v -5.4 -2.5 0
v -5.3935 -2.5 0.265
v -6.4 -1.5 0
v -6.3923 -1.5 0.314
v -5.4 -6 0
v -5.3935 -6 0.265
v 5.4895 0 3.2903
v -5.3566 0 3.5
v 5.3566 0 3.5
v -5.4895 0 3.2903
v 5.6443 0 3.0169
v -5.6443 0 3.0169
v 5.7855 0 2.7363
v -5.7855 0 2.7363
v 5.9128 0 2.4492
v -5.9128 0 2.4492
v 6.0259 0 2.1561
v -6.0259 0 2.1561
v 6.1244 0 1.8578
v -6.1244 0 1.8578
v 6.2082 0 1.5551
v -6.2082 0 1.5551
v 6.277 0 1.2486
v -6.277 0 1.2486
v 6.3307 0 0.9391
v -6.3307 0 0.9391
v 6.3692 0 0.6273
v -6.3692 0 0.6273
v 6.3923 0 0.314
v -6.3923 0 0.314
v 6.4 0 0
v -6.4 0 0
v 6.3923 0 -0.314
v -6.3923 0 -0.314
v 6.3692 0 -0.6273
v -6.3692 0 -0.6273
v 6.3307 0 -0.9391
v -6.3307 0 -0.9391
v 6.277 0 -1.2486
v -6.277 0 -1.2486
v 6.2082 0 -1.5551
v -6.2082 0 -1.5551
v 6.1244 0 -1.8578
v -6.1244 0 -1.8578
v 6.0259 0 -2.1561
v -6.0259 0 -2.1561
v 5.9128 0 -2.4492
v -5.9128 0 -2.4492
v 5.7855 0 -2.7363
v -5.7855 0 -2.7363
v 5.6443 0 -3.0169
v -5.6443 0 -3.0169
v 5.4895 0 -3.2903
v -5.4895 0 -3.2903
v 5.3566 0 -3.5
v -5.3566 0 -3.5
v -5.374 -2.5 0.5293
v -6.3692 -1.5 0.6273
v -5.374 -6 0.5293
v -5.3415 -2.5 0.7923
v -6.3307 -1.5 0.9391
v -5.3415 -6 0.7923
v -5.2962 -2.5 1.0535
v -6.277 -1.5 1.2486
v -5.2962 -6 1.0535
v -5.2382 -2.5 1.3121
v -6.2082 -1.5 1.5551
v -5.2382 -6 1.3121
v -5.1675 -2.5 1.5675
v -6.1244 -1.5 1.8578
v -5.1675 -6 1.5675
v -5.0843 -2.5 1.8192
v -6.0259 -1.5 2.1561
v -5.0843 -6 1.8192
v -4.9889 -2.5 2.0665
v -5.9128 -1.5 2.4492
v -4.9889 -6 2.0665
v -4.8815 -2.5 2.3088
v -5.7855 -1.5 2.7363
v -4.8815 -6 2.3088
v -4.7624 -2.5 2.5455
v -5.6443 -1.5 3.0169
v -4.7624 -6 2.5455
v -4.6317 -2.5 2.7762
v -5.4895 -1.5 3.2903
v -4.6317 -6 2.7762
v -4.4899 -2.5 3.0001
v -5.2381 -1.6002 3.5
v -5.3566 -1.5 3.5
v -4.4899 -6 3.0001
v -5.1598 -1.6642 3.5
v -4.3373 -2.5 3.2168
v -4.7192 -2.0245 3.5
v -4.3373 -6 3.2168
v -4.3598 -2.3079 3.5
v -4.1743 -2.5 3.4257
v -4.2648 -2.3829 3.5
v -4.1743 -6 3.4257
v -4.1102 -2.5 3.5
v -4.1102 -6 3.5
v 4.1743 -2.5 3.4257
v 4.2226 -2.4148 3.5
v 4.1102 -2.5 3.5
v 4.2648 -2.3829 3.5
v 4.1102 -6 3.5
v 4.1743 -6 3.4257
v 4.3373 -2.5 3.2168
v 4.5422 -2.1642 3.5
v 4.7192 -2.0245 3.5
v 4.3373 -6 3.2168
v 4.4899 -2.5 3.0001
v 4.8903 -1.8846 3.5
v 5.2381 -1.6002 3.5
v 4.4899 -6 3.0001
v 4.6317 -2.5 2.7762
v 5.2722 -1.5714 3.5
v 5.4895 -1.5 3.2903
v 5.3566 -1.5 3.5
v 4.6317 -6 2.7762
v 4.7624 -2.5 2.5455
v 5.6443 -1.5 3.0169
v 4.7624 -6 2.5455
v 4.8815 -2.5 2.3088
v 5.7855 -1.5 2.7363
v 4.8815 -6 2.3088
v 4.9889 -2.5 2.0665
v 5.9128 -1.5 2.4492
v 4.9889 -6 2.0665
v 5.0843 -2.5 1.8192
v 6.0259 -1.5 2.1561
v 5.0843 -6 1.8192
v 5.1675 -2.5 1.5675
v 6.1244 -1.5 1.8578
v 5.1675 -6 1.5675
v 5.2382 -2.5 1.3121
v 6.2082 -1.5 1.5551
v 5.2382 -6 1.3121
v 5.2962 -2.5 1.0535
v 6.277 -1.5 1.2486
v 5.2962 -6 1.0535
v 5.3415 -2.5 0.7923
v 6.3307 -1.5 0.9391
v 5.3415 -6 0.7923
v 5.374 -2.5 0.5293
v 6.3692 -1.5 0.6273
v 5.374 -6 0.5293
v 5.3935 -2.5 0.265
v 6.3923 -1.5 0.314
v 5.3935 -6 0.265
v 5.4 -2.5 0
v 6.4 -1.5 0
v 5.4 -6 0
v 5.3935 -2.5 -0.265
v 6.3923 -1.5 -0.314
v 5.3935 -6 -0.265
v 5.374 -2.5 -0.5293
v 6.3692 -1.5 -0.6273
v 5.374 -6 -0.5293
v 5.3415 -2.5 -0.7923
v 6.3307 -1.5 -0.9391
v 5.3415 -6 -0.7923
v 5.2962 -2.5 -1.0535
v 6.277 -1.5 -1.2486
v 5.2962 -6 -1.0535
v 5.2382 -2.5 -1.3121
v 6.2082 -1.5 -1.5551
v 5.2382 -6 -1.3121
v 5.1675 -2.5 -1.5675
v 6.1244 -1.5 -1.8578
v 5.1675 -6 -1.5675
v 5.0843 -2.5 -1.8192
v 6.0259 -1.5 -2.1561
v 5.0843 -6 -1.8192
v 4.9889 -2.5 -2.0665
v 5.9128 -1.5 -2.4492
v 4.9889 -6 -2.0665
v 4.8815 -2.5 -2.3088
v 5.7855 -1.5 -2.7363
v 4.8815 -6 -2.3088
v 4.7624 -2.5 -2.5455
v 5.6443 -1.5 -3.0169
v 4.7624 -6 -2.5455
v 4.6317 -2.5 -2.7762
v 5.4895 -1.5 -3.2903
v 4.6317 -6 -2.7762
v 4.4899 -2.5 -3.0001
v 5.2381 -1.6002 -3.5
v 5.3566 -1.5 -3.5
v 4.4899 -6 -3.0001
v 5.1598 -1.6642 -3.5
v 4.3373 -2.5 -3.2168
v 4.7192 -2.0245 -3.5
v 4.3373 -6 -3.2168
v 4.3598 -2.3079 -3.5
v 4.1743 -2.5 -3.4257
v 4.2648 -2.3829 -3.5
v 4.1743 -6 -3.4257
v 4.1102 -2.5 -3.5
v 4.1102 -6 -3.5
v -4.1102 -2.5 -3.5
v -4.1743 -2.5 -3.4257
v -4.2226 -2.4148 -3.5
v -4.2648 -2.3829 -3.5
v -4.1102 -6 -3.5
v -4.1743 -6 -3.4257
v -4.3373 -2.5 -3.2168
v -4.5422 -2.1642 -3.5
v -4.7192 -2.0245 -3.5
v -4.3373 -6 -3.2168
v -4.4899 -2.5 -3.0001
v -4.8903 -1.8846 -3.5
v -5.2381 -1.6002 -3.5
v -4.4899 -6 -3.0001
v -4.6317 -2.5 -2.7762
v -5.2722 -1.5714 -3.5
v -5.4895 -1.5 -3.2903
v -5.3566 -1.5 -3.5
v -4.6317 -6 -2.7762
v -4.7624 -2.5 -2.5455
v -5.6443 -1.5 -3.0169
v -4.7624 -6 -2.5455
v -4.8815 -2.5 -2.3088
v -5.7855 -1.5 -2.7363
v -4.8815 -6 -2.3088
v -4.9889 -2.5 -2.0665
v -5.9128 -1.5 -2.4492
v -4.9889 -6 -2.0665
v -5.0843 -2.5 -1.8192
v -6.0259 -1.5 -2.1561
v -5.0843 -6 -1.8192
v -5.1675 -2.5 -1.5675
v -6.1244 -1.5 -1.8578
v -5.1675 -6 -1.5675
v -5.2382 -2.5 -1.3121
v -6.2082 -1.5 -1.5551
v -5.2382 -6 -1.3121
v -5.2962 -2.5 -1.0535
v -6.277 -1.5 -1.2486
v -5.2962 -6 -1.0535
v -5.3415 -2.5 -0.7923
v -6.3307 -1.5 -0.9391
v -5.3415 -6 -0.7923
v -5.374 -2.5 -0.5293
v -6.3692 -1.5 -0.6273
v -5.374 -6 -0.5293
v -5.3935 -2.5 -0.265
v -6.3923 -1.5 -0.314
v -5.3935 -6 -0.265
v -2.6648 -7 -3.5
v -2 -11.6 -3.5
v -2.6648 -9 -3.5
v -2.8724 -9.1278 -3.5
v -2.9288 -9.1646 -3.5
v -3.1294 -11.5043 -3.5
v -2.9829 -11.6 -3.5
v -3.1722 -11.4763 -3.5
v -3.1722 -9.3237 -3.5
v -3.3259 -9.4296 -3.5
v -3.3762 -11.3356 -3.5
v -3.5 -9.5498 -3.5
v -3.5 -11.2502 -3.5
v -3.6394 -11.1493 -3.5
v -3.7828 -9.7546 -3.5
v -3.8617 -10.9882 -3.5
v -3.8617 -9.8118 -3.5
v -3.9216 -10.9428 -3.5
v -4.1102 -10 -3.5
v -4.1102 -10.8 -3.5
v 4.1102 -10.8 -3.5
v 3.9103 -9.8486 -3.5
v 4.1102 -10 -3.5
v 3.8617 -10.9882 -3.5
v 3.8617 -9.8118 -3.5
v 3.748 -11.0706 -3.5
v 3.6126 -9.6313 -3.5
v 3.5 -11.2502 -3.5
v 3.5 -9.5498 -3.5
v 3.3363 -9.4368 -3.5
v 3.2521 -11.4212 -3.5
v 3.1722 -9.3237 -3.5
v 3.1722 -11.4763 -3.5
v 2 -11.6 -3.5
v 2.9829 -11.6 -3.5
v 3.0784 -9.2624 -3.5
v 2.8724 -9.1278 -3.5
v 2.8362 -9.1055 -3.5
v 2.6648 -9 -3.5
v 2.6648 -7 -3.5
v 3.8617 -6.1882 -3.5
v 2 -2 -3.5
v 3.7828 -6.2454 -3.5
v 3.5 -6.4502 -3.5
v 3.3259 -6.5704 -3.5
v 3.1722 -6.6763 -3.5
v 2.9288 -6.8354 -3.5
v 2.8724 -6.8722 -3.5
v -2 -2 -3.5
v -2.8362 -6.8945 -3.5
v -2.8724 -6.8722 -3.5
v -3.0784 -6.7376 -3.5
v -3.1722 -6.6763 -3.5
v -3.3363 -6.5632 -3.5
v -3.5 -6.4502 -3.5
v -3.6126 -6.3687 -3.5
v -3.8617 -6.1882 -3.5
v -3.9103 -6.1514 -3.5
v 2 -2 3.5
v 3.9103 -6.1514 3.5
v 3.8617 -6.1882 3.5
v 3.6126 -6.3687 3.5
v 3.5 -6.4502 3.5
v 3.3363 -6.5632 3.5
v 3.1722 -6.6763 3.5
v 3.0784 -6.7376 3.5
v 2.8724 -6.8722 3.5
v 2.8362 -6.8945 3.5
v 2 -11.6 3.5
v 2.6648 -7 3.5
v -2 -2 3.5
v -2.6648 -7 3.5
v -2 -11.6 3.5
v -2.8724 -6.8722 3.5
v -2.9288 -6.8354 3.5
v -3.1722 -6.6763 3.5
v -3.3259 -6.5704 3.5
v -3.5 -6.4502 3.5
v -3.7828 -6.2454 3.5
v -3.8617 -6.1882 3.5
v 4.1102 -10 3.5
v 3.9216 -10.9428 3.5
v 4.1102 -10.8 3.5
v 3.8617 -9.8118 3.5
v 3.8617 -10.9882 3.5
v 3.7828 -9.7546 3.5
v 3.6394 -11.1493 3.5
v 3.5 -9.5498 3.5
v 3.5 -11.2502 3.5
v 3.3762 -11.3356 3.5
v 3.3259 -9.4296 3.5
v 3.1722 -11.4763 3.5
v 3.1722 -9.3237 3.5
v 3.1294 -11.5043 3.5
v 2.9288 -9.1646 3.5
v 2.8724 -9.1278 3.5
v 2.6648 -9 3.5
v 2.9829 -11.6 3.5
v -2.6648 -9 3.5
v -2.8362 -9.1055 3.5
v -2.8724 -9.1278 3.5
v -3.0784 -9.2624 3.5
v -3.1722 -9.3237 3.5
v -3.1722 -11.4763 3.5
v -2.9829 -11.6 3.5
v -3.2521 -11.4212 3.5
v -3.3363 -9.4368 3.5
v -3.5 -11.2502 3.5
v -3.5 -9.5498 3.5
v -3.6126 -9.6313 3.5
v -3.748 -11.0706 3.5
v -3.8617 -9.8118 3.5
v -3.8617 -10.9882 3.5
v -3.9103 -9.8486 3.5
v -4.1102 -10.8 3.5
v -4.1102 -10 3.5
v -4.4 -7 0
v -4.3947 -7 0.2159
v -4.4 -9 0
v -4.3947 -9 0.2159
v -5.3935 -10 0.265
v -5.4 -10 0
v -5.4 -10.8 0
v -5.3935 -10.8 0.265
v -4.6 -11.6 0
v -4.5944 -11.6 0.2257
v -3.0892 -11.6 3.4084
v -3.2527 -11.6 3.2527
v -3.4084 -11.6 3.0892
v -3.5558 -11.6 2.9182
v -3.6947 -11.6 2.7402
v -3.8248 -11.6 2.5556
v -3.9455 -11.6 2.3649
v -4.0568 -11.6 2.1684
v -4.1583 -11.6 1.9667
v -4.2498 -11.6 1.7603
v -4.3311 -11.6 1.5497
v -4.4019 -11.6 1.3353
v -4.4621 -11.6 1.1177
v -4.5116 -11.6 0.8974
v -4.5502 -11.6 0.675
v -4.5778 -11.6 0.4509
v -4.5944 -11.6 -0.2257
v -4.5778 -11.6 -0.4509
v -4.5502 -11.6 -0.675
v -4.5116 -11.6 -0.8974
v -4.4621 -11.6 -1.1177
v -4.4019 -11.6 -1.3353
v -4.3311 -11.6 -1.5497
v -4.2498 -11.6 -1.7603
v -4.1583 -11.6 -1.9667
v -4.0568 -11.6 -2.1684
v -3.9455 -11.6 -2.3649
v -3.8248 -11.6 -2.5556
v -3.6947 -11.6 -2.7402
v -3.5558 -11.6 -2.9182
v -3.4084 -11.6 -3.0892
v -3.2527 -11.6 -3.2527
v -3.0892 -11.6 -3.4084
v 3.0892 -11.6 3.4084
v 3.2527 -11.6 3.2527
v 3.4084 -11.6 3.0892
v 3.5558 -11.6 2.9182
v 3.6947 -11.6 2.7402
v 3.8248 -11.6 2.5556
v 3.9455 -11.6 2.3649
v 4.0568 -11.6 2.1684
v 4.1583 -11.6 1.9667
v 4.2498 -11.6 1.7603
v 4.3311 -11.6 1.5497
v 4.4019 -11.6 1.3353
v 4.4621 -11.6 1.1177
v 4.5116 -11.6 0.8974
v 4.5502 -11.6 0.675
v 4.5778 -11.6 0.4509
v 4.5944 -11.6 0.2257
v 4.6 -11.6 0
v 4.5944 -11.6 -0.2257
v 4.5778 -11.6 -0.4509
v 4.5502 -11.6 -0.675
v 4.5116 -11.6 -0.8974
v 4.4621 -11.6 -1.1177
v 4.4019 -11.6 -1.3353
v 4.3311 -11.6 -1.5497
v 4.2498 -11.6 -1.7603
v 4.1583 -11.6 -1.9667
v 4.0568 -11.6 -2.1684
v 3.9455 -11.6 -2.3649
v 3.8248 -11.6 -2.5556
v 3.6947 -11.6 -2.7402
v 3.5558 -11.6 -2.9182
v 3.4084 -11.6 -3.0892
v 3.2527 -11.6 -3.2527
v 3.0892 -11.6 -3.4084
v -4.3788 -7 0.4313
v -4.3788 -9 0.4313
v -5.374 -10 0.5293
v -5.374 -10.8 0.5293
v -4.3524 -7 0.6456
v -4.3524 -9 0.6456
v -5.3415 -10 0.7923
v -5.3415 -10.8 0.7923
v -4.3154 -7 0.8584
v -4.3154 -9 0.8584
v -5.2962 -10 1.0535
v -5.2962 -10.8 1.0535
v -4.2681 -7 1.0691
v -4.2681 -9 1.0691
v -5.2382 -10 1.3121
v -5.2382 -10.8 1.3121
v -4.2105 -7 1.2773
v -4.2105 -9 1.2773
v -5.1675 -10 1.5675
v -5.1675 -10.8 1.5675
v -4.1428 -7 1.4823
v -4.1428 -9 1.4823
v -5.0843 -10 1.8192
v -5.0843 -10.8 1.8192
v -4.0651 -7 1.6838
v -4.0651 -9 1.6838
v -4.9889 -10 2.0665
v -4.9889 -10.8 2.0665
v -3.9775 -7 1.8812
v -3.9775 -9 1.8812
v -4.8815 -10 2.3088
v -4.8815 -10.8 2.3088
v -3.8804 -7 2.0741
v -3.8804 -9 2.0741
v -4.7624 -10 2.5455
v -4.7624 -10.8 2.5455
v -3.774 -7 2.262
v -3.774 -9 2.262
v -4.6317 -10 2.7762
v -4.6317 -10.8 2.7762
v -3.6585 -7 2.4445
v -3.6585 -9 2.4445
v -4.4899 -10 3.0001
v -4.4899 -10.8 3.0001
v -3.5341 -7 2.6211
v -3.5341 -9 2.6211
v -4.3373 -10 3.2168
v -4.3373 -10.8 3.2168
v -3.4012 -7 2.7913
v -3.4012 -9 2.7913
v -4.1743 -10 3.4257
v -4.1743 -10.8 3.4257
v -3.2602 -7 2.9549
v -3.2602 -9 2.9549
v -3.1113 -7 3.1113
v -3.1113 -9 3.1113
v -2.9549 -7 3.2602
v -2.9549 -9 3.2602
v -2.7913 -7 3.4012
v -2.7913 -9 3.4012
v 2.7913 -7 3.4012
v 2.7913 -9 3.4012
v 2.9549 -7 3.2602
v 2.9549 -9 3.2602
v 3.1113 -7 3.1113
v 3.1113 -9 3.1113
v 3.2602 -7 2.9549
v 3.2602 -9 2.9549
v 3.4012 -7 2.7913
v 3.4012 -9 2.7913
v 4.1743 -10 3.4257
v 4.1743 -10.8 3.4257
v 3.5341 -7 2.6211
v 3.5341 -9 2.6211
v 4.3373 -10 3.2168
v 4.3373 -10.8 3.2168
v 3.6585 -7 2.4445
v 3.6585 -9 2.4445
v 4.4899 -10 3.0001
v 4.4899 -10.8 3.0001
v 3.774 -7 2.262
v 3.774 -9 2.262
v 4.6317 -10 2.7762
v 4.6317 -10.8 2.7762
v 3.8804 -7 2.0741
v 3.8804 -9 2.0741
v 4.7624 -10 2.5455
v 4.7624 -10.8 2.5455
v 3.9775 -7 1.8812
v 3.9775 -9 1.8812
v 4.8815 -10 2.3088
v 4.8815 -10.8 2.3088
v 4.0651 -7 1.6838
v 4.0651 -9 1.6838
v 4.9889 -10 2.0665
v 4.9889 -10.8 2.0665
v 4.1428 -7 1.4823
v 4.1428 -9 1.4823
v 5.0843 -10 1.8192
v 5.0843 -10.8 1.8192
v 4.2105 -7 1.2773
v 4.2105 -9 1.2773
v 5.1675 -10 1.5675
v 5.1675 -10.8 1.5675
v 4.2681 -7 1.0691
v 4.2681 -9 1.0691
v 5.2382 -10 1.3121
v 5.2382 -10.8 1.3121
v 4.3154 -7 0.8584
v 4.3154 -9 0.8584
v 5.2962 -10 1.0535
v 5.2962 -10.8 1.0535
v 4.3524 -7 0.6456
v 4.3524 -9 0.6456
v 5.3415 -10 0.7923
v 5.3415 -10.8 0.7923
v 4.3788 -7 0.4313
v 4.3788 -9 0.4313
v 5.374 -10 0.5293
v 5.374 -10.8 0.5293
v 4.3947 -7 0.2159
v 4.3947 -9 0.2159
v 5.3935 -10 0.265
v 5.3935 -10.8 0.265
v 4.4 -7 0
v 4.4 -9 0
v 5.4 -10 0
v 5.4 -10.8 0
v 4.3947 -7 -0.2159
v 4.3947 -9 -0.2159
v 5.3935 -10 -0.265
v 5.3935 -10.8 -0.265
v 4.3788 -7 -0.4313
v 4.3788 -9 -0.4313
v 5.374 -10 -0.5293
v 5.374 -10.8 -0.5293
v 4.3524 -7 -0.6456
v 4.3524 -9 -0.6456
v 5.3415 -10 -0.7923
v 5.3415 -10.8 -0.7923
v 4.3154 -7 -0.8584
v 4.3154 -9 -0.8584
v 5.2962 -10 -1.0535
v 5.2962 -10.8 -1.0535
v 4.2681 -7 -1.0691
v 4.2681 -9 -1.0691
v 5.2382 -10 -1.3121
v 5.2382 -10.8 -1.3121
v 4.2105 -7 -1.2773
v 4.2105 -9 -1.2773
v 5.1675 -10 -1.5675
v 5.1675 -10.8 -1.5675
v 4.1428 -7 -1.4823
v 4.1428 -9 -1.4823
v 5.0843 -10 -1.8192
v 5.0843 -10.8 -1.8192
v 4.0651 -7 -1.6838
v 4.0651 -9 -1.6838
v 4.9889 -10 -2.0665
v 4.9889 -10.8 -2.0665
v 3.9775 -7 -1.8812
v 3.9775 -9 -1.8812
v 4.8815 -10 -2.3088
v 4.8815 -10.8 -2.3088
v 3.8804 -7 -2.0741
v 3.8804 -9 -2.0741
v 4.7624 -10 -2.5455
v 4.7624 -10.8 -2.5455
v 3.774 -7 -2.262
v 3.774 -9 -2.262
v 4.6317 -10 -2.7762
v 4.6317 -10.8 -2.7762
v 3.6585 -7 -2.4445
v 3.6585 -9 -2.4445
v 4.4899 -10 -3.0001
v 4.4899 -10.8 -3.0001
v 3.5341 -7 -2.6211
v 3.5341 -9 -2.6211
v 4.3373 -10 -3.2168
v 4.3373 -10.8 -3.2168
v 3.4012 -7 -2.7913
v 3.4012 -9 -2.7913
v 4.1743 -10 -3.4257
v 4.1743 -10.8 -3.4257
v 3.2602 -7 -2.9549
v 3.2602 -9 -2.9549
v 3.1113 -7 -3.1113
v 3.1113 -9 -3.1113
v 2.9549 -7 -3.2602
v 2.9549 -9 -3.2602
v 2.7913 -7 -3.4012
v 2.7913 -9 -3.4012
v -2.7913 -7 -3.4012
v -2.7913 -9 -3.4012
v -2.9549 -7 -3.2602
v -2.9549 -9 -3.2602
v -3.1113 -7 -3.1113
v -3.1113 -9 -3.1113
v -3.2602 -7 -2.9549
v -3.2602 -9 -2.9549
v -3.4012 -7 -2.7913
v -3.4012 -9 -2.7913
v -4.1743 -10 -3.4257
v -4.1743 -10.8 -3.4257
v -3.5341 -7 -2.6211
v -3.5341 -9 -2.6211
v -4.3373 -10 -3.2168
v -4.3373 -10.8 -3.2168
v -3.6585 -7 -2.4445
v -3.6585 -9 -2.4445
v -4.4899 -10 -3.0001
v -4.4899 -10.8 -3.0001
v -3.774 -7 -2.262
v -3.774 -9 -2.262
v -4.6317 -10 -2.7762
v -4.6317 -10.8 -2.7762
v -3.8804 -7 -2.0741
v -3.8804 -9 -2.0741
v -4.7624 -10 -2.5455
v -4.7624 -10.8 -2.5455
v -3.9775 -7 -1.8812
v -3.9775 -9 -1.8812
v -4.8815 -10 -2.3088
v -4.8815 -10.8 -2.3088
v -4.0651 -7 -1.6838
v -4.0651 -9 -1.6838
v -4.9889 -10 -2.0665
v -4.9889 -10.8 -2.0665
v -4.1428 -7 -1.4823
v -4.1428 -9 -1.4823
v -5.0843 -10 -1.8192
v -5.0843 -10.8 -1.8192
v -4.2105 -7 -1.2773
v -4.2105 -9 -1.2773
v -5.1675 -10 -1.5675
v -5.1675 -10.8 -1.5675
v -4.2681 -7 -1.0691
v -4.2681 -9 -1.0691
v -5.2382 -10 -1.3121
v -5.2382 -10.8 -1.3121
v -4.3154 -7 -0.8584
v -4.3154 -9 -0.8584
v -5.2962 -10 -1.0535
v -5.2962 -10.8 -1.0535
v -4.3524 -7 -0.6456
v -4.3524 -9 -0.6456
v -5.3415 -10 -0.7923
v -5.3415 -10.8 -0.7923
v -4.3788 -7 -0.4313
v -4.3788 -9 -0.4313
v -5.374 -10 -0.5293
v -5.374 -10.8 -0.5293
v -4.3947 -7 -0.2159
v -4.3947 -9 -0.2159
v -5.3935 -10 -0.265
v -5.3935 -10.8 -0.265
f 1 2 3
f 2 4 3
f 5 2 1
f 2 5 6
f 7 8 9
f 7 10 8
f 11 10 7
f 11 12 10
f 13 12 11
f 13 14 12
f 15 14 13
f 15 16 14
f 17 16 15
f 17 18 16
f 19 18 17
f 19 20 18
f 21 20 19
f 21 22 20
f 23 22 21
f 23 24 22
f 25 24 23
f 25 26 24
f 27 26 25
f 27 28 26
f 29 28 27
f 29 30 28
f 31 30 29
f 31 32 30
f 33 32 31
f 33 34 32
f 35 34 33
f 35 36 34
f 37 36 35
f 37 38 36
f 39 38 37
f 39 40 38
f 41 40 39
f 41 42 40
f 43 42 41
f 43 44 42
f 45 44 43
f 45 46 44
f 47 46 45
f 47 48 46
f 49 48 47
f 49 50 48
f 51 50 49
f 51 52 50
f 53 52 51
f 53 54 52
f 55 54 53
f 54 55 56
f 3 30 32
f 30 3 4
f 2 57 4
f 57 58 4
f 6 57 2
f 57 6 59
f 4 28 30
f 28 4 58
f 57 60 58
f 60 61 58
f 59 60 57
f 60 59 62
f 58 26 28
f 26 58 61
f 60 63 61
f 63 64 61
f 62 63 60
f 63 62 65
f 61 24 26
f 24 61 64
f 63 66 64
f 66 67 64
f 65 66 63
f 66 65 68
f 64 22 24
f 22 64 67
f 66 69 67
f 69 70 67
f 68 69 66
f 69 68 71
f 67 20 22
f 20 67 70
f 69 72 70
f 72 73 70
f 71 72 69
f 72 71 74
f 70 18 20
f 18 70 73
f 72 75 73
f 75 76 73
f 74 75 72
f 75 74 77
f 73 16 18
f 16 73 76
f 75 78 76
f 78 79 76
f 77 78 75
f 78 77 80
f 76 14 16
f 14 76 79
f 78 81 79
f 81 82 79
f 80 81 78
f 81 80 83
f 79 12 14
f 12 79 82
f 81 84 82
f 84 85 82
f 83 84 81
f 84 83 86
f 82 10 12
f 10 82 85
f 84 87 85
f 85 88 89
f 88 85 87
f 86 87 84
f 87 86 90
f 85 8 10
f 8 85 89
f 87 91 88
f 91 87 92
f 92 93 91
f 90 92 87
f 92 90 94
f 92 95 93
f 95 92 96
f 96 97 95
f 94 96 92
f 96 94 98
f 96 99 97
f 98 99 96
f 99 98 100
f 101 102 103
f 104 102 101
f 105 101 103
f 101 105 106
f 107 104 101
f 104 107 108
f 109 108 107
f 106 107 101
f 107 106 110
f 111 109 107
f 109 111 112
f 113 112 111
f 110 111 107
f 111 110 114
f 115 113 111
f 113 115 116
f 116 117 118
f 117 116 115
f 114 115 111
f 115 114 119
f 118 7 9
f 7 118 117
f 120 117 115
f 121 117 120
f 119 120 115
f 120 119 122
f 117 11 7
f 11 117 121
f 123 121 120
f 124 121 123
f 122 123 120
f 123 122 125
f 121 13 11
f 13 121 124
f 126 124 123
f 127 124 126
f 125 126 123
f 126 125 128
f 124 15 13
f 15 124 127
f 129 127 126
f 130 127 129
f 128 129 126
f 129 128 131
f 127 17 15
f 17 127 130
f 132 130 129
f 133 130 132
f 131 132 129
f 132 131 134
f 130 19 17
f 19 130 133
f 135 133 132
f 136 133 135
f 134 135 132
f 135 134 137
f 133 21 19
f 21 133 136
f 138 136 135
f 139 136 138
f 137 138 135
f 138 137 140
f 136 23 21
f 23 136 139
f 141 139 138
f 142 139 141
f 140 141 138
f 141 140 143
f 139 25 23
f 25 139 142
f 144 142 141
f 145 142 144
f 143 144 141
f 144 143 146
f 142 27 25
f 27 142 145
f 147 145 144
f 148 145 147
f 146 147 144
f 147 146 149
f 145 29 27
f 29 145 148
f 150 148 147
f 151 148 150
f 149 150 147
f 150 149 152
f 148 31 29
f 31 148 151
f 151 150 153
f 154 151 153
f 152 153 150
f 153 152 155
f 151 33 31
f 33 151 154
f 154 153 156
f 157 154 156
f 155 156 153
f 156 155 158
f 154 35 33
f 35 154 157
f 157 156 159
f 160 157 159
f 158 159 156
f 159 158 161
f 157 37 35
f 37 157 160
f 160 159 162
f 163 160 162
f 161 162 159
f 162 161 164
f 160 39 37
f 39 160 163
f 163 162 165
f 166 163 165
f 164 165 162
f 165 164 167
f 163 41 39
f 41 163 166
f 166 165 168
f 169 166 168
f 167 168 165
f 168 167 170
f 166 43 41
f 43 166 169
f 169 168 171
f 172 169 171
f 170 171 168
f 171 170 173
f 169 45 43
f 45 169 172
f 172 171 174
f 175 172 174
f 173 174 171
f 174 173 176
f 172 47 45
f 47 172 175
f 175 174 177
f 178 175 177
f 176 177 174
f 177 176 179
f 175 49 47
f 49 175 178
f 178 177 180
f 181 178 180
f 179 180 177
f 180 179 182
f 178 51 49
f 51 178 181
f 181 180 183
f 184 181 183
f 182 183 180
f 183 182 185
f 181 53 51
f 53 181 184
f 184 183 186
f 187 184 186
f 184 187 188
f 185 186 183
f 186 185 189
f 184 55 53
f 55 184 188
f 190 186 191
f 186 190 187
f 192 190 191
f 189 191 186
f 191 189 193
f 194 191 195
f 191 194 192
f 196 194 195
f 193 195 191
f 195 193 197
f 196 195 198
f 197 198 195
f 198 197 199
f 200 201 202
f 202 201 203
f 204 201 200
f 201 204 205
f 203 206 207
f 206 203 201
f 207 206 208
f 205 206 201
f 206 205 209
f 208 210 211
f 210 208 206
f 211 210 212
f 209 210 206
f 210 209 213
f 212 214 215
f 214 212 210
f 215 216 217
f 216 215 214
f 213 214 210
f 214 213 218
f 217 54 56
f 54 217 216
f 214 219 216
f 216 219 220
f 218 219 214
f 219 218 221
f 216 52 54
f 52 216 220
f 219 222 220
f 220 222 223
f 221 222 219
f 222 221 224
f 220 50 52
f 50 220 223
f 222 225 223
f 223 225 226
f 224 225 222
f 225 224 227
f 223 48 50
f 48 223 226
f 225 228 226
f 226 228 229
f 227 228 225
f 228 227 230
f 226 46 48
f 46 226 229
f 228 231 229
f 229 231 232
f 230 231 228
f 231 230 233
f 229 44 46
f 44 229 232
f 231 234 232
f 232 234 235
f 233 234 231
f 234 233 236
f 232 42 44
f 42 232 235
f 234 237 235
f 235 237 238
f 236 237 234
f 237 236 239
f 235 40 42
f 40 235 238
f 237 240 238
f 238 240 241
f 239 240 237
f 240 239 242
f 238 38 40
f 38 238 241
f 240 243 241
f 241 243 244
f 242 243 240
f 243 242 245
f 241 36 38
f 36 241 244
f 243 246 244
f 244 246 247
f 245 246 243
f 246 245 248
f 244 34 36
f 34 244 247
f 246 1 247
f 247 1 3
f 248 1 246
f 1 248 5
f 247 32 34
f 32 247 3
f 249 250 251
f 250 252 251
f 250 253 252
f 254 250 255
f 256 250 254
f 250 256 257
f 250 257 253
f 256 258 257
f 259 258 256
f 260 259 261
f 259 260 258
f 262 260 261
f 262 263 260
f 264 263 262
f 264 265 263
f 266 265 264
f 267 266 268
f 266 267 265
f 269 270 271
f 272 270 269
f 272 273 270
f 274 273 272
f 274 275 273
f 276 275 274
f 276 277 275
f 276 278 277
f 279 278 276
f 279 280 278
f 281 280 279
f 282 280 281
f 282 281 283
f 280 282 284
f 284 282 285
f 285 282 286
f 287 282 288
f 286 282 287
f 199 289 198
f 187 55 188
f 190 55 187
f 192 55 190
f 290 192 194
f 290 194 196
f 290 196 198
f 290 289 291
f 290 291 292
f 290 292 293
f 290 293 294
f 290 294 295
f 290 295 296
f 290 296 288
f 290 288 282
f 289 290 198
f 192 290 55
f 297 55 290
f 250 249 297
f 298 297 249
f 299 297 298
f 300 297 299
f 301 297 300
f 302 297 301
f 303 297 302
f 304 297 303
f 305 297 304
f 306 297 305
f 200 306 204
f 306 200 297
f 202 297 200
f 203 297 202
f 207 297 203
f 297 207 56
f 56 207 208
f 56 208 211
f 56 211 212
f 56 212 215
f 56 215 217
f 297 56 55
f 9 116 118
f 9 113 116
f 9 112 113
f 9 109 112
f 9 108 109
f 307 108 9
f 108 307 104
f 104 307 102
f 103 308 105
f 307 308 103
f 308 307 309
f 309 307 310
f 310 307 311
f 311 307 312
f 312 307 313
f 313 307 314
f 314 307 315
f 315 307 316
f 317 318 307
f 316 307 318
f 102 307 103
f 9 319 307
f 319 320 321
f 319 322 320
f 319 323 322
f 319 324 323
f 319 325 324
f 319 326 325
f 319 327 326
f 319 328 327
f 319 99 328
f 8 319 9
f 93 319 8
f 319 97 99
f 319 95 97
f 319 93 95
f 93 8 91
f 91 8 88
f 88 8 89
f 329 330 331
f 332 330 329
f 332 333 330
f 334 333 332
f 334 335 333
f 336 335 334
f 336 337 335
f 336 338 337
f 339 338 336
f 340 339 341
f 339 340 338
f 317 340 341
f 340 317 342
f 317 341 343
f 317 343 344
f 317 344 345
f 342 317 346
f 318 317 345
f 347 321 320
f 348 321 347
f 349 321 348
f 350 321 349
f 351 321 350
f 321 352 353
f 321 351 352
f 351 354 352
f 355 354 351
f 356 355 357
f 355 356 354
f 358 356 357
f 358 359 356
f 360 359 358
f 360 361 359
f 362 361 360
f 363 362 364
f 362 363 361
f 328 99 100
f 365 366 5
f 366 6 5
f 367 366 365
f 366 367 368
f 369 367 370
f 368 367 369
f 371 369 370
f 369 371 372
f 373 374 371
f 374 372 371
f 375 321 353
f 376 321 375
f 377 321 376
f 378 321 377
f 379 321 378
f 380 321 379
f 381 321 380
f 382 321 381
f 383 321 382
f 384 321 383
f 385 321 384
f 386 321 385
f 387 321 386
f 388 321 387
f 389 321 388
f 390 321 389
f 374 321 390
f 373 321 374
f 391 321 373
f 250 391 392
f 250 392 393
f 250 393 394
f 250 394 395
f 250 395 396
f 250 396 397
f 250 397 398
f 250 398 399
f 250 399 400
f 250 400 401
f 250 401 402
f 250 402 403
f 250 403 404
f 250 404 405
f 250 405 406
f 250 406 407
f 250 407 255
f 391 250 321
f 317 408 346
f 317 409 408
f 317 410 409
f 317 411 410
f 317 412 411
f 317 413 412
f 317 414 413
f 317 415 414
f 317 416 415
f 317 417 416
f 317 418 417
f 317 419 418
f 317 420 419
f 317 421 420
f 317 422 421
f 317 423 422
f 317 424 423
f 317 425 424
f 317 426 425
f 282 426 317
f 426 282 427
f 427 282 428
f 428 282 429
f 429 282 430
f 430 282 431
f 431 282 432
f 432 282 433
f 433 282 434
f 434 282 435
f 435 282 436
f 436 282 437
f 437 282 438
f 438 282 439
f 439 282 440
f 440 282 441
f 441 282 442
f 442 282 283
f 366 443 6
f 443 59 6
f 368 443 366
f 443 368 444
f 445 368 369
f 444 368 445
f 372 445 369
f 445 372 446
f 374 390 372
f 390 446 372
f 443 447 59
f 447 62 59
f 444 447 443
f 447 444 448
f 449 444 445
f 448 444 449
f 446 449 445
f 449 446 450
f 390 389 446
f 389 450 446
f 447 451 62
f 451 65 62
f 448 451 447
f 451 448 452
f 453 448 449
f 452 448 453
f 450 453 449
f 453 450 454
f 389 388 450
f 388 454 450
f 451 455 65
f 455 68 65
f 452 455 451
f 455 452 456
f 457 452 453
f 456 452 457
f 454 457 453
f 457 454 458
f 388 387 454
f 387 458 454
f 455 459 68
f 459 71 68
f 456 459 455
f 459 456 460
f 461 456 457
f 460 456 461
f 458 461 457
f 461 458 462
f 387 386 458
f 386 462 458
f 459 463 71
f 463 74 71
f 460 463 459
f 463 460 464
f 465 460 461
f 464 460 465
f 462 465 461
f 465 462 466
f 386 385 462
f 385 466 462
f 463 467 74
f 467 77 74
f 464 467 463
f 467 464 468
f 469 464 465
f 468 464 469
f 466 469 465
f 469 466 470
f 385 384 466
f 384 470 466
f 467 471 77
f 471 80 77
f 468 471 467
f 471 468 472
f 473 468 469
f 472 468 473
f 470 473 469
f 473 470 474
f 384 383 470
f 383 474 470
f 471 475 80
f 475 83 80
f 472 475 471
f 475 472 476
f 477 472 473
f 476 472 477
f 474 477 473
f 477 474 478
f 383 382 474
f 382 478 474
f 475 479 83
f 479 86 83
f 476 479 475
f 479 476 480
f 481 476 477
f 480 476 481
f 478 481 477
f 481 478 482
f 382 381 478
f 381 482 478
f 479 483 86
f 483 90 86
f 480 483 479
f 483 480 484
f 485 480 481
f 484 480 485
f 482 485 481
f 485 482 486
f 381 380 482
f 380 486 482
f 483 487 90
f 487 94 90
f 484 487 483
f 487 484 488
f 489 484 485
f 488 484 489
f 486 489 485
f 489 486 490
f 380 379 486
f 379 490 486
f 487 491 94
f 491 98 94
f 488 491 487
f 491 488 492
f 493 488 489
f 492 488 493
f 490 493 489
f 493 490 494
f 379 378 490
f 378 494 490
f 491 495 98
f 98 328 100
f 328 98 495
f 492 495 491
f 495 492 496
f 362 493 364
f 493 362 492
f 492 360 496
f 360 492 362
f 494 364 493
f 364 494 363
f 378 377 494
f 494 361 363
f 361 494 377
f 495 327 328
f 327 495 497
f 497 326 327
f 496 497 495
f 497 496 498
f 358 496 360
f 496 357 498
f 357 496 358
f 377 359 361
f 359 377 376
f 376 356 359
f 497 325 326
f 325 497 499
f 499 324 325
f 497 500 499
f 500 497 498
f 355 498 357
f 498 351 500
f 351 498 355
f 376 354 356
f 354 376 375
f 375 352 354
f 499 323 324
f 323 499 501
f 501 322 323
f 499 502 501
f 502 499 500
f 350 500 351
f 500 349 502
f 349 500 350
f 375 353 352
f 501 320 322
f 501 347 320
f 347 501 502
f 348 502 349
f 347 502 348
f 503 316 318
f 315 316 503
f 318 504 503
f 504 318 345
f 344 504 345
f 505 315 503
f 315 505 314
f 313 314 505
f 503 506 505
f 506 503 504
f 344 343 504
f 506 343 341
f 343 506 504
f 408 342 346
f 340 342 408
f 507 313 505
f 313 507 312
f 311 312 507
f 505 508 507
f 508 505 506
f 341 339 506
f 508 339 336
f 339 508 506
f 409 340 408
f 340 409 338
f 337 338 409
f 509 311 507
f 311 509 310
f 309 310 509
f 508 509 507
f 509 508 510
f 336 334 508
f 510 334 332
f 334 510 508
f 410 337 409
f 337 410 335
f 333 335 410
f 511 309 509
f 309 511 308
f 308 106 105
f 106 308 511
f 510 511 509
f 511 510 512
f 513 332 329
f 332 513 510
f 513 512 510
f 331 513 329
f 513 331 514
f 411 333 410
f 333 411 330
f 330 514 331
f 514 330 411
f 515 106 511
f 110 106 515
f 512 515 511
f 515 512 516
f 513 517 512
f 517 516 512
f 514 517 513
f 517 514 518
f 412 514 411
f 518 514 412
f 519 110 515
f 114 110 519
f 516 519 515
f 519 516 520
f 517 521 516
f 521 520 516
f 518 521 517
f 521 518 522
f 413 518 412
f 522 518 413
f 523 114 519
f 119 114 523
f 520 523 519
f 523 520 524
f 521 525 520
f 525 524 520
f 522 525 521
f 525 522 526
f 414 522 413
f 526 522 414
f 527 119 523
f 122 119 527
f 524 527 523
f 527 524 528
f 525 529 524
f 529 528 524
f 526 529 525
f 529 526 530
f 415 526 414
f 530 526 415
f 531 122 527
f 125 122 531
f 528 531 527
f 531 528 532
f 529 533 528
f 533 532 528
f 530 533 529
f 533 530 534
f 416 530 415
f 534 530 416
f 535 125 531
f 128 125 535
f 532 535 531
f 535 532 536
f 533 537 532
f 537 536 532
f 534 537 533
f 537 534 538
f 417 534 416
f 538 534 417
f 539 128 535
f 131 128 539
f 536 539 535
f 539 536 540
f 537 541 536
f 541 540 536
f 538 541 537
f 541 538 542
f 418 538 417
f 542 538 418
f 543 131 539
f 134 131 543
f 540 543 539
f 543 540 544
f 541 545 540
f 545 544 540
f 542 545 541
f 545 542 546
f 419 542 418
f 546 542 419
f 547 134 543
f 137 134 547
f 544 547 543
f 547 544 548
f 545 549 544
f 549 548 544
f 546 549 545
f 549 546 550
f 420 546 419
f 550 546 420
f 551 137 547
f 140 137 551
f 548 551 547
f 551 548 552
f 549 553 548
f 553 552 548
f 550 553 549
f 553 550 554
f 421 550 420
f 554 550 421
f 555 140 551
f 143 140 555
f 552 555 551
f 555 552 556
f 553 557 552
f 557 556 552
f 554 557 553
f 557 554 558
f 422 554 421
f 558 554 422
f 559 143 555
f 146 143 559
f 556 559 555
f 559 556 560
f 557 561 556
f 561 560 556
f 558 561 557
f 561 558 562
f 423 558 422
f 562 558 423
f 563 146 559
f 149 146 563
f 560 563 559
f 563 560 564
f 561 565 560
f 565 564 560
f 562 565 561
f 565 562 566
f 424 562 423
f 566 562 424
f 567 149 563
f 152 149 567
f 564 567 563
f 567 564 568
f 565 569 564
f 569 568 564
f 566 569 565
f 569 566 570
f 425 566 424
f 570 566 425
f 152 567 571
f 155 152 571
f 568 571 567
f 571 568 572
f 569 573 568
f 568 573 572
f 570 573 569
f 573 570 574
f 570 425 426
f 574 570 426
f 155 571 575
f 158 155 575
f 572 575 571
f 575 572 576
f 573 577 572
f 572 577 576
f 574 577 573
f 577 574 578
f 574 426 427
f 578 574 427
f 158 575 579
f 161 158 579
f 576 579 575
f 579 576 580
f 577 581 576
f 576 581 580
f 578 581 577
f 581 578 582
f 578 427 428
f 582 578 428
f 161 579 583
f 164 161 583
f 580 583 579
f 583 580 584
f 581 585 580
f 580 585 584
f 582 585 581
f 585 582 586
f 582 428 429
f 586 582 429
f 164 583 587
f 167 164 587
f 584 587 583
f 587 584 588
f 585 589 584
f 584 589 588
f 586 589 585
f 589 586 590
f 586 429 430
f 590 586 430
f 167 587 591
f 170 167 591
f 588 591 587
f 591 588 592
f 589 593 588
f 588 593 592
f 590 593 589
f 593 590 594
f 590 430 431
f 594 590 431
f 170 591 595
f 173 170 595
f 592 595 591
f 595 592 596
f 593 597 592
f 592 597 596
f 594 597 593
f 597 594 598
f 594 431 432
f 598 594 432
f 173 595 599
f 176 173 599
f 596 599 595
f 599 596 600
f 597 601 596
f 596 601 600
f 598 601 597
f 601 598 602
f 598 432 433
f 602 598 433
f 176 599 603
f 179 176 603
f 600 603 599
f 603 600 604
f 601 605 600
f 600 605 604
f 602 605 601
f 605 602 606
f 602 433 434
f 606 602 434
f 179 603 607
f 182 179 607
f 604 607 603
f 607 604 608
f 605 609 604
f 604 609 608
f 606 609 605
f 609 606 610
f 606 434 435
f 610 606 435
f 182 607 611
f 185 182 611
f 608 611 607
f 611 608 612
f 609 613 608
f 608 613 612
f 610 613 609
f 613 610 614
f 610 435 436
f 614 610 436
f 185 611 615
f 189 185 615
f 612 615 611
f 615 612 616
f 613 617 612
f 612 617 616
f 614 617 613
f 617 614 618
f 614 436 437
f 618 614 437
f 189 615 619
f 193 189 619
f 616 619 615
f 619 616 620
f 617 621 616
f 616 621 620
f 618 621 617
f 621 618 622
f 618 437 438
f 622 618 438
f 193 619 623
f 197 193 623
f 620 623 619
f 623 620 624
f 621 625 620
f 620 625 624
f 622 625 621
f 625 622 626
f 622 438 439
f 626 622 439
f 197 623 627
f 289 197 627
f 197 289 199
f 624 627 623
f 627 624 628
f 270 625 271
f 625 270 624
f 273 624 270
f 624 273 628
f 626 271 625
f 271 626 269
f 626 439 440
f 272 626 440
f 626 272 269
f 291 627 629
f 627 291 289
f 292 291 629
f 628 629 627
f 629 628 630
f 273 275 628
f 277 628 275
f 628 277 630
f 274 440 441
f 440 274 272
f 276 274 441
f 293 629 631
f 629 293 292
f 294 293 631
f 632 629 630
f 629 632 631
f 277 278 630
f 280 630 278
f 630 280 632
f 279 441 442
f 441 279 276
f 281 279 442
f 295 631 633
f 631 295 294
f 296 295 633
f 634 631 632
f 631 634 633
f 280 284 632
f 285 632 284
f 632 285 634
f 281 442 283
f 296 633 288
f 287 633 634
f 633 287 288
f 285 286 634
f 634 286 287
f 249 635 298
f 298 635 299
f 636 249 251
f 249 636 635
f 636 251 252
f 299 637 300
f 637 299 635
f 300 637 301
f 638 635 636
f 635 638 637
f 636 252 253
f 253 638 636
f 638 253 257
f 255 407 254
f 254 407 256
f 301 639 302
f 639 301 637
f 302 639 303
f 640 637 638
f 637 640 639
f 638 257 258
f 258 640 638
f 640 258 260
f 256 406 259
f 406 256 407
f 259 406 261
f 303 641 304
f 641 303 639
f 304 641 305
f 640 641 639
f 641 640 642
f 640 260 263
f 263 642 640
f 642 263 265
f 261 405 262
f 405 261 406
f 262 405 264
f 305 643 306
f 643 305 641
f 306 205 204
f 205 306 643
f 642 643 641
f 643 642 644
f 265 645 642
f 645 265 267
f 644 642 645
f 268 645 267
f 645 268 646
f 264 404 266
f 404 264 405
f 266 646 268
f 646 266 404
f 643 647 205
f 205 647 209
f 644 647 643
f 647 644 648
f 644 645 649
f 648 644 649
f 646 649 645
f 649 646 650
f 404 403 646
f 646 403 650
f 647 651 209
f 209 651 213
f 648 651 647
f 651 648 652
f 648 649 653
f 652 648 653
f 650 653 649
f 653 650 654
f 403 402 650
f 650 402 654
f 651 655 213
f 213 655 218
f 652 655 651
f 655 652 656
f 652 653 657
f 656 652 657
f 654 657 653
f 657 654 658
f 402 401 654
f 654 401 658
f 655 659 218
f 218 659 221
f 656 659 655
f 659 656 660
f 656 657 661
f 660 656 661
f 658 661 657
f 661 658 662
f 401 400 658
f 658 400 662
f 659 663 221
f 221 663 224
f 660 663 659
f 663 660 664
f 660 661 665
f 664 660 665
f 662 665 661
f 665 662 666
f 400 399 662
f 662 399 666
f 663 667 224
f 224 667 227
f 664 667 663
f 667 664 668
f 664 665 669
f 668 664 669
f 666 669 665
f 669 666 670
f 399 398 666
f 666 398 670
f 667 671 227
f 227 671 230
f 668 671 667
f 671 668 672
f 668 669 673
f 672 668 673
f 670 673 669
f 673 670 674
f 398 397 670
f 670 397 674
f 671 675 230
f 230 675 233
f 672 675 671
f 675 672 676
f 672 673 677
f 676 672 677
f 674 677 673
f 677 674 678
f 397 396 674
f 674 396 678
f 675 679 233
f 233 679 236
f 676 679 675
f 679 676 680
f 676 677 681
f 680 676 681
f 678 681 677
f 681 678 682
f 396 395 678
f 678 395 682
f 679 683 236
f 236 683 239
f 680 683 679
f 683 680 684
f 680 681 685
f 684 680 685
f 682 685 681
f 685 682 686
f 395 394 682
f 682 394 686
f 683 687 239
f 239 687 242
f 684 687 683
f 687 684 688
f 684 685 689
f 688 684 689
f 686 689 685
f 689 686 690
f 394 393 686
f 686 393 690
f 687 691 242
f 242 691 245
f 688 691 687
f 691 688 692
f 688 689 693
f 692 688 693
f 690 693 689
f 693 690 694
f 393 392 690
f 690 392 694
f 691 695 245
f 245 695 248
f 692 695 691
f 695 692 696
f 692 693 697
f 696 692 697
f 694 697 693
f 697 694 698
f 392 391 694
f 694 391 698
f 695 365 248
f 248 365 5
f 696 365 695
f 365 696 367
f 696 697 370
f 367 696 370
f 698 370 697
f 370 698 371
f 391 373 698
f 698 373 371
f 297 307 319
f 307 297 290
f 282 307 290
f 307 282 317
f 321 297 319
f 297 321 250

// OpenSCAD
rotate([90.0, 0.0, 0.0])
{
    difference()
    {
        union()
        {
            intersection()
            {
                rotate_extrude(angle = 360.0, $fn = 128)
                {
                    M14();
                }
                linear_extrude(height = 8.0, twist = 0.0, scale = 1.0, slices = 1, center = false)
                {
                    scale([16.0, 7.0])
                    {
                        M17();
                    }
                }
            }
            translate([0.0, 0.0, 4.0])
            {
                intersection()
                {
                    rotate_extrude(angle = 360.0, $fn = 128)
                    {
                        M29();
                    }
                    linear_extrude(height = 8.0, twist = 0.0, scale = 1.0, slices = 1, center = false)
                    {
                        scale([16.0, 7.0])
                        {
                            M17();
                        }
                    }
                }
            }
        }
        translate([0.0, 0.0, 2.0])
        {
            linear_extrude(height = 10.0, twist = 0.0, scale = 1.0, slices = 1, center = false)
            {
                scale([4.0, 16.0])
                {
                    M17();
                }
            }
        }
    }
}

module M17()
{
    polygon
    (
        points =
        [
            [-0.5, -0.5], 
            [0.5, -0.5], 
            [0.5, 0.5], 
            [-0.5, 0.5]
        ],
        paths =
        [
            [0, 1, 2, 3]
        ]
    );
}

module M29()
{
    polygon
    (
        points =
        [
            [0.0, 0.0], 
            [5.4, 0.0], 
            [5.4, 2.0], 
            [4.4, 3.0], 
            [4.4, 5.0], 
            [5.4, 6.0], 
            [5.4, 6.8], 
            [4.6000000000000005, 7.6], 
            [0.0, 7.6]
        ],
        paths =
        [
            [0, 1, 2, 3, 4, 5, 6, 7, 8]
        ]
    );
}

module M14()
{
    polygon
    (
        points =
        [
            [0.0, 0.0], 
            [6.4, 0.0], 
            [6.4, 1.5], 
            [5.4, 2.5], 
            [5.4, 4.0], 
            [0.0, 4.0]
        ],
        paths =
        [
            [0, 1, 2, 3, 4, 5]
        ]
    );
}
